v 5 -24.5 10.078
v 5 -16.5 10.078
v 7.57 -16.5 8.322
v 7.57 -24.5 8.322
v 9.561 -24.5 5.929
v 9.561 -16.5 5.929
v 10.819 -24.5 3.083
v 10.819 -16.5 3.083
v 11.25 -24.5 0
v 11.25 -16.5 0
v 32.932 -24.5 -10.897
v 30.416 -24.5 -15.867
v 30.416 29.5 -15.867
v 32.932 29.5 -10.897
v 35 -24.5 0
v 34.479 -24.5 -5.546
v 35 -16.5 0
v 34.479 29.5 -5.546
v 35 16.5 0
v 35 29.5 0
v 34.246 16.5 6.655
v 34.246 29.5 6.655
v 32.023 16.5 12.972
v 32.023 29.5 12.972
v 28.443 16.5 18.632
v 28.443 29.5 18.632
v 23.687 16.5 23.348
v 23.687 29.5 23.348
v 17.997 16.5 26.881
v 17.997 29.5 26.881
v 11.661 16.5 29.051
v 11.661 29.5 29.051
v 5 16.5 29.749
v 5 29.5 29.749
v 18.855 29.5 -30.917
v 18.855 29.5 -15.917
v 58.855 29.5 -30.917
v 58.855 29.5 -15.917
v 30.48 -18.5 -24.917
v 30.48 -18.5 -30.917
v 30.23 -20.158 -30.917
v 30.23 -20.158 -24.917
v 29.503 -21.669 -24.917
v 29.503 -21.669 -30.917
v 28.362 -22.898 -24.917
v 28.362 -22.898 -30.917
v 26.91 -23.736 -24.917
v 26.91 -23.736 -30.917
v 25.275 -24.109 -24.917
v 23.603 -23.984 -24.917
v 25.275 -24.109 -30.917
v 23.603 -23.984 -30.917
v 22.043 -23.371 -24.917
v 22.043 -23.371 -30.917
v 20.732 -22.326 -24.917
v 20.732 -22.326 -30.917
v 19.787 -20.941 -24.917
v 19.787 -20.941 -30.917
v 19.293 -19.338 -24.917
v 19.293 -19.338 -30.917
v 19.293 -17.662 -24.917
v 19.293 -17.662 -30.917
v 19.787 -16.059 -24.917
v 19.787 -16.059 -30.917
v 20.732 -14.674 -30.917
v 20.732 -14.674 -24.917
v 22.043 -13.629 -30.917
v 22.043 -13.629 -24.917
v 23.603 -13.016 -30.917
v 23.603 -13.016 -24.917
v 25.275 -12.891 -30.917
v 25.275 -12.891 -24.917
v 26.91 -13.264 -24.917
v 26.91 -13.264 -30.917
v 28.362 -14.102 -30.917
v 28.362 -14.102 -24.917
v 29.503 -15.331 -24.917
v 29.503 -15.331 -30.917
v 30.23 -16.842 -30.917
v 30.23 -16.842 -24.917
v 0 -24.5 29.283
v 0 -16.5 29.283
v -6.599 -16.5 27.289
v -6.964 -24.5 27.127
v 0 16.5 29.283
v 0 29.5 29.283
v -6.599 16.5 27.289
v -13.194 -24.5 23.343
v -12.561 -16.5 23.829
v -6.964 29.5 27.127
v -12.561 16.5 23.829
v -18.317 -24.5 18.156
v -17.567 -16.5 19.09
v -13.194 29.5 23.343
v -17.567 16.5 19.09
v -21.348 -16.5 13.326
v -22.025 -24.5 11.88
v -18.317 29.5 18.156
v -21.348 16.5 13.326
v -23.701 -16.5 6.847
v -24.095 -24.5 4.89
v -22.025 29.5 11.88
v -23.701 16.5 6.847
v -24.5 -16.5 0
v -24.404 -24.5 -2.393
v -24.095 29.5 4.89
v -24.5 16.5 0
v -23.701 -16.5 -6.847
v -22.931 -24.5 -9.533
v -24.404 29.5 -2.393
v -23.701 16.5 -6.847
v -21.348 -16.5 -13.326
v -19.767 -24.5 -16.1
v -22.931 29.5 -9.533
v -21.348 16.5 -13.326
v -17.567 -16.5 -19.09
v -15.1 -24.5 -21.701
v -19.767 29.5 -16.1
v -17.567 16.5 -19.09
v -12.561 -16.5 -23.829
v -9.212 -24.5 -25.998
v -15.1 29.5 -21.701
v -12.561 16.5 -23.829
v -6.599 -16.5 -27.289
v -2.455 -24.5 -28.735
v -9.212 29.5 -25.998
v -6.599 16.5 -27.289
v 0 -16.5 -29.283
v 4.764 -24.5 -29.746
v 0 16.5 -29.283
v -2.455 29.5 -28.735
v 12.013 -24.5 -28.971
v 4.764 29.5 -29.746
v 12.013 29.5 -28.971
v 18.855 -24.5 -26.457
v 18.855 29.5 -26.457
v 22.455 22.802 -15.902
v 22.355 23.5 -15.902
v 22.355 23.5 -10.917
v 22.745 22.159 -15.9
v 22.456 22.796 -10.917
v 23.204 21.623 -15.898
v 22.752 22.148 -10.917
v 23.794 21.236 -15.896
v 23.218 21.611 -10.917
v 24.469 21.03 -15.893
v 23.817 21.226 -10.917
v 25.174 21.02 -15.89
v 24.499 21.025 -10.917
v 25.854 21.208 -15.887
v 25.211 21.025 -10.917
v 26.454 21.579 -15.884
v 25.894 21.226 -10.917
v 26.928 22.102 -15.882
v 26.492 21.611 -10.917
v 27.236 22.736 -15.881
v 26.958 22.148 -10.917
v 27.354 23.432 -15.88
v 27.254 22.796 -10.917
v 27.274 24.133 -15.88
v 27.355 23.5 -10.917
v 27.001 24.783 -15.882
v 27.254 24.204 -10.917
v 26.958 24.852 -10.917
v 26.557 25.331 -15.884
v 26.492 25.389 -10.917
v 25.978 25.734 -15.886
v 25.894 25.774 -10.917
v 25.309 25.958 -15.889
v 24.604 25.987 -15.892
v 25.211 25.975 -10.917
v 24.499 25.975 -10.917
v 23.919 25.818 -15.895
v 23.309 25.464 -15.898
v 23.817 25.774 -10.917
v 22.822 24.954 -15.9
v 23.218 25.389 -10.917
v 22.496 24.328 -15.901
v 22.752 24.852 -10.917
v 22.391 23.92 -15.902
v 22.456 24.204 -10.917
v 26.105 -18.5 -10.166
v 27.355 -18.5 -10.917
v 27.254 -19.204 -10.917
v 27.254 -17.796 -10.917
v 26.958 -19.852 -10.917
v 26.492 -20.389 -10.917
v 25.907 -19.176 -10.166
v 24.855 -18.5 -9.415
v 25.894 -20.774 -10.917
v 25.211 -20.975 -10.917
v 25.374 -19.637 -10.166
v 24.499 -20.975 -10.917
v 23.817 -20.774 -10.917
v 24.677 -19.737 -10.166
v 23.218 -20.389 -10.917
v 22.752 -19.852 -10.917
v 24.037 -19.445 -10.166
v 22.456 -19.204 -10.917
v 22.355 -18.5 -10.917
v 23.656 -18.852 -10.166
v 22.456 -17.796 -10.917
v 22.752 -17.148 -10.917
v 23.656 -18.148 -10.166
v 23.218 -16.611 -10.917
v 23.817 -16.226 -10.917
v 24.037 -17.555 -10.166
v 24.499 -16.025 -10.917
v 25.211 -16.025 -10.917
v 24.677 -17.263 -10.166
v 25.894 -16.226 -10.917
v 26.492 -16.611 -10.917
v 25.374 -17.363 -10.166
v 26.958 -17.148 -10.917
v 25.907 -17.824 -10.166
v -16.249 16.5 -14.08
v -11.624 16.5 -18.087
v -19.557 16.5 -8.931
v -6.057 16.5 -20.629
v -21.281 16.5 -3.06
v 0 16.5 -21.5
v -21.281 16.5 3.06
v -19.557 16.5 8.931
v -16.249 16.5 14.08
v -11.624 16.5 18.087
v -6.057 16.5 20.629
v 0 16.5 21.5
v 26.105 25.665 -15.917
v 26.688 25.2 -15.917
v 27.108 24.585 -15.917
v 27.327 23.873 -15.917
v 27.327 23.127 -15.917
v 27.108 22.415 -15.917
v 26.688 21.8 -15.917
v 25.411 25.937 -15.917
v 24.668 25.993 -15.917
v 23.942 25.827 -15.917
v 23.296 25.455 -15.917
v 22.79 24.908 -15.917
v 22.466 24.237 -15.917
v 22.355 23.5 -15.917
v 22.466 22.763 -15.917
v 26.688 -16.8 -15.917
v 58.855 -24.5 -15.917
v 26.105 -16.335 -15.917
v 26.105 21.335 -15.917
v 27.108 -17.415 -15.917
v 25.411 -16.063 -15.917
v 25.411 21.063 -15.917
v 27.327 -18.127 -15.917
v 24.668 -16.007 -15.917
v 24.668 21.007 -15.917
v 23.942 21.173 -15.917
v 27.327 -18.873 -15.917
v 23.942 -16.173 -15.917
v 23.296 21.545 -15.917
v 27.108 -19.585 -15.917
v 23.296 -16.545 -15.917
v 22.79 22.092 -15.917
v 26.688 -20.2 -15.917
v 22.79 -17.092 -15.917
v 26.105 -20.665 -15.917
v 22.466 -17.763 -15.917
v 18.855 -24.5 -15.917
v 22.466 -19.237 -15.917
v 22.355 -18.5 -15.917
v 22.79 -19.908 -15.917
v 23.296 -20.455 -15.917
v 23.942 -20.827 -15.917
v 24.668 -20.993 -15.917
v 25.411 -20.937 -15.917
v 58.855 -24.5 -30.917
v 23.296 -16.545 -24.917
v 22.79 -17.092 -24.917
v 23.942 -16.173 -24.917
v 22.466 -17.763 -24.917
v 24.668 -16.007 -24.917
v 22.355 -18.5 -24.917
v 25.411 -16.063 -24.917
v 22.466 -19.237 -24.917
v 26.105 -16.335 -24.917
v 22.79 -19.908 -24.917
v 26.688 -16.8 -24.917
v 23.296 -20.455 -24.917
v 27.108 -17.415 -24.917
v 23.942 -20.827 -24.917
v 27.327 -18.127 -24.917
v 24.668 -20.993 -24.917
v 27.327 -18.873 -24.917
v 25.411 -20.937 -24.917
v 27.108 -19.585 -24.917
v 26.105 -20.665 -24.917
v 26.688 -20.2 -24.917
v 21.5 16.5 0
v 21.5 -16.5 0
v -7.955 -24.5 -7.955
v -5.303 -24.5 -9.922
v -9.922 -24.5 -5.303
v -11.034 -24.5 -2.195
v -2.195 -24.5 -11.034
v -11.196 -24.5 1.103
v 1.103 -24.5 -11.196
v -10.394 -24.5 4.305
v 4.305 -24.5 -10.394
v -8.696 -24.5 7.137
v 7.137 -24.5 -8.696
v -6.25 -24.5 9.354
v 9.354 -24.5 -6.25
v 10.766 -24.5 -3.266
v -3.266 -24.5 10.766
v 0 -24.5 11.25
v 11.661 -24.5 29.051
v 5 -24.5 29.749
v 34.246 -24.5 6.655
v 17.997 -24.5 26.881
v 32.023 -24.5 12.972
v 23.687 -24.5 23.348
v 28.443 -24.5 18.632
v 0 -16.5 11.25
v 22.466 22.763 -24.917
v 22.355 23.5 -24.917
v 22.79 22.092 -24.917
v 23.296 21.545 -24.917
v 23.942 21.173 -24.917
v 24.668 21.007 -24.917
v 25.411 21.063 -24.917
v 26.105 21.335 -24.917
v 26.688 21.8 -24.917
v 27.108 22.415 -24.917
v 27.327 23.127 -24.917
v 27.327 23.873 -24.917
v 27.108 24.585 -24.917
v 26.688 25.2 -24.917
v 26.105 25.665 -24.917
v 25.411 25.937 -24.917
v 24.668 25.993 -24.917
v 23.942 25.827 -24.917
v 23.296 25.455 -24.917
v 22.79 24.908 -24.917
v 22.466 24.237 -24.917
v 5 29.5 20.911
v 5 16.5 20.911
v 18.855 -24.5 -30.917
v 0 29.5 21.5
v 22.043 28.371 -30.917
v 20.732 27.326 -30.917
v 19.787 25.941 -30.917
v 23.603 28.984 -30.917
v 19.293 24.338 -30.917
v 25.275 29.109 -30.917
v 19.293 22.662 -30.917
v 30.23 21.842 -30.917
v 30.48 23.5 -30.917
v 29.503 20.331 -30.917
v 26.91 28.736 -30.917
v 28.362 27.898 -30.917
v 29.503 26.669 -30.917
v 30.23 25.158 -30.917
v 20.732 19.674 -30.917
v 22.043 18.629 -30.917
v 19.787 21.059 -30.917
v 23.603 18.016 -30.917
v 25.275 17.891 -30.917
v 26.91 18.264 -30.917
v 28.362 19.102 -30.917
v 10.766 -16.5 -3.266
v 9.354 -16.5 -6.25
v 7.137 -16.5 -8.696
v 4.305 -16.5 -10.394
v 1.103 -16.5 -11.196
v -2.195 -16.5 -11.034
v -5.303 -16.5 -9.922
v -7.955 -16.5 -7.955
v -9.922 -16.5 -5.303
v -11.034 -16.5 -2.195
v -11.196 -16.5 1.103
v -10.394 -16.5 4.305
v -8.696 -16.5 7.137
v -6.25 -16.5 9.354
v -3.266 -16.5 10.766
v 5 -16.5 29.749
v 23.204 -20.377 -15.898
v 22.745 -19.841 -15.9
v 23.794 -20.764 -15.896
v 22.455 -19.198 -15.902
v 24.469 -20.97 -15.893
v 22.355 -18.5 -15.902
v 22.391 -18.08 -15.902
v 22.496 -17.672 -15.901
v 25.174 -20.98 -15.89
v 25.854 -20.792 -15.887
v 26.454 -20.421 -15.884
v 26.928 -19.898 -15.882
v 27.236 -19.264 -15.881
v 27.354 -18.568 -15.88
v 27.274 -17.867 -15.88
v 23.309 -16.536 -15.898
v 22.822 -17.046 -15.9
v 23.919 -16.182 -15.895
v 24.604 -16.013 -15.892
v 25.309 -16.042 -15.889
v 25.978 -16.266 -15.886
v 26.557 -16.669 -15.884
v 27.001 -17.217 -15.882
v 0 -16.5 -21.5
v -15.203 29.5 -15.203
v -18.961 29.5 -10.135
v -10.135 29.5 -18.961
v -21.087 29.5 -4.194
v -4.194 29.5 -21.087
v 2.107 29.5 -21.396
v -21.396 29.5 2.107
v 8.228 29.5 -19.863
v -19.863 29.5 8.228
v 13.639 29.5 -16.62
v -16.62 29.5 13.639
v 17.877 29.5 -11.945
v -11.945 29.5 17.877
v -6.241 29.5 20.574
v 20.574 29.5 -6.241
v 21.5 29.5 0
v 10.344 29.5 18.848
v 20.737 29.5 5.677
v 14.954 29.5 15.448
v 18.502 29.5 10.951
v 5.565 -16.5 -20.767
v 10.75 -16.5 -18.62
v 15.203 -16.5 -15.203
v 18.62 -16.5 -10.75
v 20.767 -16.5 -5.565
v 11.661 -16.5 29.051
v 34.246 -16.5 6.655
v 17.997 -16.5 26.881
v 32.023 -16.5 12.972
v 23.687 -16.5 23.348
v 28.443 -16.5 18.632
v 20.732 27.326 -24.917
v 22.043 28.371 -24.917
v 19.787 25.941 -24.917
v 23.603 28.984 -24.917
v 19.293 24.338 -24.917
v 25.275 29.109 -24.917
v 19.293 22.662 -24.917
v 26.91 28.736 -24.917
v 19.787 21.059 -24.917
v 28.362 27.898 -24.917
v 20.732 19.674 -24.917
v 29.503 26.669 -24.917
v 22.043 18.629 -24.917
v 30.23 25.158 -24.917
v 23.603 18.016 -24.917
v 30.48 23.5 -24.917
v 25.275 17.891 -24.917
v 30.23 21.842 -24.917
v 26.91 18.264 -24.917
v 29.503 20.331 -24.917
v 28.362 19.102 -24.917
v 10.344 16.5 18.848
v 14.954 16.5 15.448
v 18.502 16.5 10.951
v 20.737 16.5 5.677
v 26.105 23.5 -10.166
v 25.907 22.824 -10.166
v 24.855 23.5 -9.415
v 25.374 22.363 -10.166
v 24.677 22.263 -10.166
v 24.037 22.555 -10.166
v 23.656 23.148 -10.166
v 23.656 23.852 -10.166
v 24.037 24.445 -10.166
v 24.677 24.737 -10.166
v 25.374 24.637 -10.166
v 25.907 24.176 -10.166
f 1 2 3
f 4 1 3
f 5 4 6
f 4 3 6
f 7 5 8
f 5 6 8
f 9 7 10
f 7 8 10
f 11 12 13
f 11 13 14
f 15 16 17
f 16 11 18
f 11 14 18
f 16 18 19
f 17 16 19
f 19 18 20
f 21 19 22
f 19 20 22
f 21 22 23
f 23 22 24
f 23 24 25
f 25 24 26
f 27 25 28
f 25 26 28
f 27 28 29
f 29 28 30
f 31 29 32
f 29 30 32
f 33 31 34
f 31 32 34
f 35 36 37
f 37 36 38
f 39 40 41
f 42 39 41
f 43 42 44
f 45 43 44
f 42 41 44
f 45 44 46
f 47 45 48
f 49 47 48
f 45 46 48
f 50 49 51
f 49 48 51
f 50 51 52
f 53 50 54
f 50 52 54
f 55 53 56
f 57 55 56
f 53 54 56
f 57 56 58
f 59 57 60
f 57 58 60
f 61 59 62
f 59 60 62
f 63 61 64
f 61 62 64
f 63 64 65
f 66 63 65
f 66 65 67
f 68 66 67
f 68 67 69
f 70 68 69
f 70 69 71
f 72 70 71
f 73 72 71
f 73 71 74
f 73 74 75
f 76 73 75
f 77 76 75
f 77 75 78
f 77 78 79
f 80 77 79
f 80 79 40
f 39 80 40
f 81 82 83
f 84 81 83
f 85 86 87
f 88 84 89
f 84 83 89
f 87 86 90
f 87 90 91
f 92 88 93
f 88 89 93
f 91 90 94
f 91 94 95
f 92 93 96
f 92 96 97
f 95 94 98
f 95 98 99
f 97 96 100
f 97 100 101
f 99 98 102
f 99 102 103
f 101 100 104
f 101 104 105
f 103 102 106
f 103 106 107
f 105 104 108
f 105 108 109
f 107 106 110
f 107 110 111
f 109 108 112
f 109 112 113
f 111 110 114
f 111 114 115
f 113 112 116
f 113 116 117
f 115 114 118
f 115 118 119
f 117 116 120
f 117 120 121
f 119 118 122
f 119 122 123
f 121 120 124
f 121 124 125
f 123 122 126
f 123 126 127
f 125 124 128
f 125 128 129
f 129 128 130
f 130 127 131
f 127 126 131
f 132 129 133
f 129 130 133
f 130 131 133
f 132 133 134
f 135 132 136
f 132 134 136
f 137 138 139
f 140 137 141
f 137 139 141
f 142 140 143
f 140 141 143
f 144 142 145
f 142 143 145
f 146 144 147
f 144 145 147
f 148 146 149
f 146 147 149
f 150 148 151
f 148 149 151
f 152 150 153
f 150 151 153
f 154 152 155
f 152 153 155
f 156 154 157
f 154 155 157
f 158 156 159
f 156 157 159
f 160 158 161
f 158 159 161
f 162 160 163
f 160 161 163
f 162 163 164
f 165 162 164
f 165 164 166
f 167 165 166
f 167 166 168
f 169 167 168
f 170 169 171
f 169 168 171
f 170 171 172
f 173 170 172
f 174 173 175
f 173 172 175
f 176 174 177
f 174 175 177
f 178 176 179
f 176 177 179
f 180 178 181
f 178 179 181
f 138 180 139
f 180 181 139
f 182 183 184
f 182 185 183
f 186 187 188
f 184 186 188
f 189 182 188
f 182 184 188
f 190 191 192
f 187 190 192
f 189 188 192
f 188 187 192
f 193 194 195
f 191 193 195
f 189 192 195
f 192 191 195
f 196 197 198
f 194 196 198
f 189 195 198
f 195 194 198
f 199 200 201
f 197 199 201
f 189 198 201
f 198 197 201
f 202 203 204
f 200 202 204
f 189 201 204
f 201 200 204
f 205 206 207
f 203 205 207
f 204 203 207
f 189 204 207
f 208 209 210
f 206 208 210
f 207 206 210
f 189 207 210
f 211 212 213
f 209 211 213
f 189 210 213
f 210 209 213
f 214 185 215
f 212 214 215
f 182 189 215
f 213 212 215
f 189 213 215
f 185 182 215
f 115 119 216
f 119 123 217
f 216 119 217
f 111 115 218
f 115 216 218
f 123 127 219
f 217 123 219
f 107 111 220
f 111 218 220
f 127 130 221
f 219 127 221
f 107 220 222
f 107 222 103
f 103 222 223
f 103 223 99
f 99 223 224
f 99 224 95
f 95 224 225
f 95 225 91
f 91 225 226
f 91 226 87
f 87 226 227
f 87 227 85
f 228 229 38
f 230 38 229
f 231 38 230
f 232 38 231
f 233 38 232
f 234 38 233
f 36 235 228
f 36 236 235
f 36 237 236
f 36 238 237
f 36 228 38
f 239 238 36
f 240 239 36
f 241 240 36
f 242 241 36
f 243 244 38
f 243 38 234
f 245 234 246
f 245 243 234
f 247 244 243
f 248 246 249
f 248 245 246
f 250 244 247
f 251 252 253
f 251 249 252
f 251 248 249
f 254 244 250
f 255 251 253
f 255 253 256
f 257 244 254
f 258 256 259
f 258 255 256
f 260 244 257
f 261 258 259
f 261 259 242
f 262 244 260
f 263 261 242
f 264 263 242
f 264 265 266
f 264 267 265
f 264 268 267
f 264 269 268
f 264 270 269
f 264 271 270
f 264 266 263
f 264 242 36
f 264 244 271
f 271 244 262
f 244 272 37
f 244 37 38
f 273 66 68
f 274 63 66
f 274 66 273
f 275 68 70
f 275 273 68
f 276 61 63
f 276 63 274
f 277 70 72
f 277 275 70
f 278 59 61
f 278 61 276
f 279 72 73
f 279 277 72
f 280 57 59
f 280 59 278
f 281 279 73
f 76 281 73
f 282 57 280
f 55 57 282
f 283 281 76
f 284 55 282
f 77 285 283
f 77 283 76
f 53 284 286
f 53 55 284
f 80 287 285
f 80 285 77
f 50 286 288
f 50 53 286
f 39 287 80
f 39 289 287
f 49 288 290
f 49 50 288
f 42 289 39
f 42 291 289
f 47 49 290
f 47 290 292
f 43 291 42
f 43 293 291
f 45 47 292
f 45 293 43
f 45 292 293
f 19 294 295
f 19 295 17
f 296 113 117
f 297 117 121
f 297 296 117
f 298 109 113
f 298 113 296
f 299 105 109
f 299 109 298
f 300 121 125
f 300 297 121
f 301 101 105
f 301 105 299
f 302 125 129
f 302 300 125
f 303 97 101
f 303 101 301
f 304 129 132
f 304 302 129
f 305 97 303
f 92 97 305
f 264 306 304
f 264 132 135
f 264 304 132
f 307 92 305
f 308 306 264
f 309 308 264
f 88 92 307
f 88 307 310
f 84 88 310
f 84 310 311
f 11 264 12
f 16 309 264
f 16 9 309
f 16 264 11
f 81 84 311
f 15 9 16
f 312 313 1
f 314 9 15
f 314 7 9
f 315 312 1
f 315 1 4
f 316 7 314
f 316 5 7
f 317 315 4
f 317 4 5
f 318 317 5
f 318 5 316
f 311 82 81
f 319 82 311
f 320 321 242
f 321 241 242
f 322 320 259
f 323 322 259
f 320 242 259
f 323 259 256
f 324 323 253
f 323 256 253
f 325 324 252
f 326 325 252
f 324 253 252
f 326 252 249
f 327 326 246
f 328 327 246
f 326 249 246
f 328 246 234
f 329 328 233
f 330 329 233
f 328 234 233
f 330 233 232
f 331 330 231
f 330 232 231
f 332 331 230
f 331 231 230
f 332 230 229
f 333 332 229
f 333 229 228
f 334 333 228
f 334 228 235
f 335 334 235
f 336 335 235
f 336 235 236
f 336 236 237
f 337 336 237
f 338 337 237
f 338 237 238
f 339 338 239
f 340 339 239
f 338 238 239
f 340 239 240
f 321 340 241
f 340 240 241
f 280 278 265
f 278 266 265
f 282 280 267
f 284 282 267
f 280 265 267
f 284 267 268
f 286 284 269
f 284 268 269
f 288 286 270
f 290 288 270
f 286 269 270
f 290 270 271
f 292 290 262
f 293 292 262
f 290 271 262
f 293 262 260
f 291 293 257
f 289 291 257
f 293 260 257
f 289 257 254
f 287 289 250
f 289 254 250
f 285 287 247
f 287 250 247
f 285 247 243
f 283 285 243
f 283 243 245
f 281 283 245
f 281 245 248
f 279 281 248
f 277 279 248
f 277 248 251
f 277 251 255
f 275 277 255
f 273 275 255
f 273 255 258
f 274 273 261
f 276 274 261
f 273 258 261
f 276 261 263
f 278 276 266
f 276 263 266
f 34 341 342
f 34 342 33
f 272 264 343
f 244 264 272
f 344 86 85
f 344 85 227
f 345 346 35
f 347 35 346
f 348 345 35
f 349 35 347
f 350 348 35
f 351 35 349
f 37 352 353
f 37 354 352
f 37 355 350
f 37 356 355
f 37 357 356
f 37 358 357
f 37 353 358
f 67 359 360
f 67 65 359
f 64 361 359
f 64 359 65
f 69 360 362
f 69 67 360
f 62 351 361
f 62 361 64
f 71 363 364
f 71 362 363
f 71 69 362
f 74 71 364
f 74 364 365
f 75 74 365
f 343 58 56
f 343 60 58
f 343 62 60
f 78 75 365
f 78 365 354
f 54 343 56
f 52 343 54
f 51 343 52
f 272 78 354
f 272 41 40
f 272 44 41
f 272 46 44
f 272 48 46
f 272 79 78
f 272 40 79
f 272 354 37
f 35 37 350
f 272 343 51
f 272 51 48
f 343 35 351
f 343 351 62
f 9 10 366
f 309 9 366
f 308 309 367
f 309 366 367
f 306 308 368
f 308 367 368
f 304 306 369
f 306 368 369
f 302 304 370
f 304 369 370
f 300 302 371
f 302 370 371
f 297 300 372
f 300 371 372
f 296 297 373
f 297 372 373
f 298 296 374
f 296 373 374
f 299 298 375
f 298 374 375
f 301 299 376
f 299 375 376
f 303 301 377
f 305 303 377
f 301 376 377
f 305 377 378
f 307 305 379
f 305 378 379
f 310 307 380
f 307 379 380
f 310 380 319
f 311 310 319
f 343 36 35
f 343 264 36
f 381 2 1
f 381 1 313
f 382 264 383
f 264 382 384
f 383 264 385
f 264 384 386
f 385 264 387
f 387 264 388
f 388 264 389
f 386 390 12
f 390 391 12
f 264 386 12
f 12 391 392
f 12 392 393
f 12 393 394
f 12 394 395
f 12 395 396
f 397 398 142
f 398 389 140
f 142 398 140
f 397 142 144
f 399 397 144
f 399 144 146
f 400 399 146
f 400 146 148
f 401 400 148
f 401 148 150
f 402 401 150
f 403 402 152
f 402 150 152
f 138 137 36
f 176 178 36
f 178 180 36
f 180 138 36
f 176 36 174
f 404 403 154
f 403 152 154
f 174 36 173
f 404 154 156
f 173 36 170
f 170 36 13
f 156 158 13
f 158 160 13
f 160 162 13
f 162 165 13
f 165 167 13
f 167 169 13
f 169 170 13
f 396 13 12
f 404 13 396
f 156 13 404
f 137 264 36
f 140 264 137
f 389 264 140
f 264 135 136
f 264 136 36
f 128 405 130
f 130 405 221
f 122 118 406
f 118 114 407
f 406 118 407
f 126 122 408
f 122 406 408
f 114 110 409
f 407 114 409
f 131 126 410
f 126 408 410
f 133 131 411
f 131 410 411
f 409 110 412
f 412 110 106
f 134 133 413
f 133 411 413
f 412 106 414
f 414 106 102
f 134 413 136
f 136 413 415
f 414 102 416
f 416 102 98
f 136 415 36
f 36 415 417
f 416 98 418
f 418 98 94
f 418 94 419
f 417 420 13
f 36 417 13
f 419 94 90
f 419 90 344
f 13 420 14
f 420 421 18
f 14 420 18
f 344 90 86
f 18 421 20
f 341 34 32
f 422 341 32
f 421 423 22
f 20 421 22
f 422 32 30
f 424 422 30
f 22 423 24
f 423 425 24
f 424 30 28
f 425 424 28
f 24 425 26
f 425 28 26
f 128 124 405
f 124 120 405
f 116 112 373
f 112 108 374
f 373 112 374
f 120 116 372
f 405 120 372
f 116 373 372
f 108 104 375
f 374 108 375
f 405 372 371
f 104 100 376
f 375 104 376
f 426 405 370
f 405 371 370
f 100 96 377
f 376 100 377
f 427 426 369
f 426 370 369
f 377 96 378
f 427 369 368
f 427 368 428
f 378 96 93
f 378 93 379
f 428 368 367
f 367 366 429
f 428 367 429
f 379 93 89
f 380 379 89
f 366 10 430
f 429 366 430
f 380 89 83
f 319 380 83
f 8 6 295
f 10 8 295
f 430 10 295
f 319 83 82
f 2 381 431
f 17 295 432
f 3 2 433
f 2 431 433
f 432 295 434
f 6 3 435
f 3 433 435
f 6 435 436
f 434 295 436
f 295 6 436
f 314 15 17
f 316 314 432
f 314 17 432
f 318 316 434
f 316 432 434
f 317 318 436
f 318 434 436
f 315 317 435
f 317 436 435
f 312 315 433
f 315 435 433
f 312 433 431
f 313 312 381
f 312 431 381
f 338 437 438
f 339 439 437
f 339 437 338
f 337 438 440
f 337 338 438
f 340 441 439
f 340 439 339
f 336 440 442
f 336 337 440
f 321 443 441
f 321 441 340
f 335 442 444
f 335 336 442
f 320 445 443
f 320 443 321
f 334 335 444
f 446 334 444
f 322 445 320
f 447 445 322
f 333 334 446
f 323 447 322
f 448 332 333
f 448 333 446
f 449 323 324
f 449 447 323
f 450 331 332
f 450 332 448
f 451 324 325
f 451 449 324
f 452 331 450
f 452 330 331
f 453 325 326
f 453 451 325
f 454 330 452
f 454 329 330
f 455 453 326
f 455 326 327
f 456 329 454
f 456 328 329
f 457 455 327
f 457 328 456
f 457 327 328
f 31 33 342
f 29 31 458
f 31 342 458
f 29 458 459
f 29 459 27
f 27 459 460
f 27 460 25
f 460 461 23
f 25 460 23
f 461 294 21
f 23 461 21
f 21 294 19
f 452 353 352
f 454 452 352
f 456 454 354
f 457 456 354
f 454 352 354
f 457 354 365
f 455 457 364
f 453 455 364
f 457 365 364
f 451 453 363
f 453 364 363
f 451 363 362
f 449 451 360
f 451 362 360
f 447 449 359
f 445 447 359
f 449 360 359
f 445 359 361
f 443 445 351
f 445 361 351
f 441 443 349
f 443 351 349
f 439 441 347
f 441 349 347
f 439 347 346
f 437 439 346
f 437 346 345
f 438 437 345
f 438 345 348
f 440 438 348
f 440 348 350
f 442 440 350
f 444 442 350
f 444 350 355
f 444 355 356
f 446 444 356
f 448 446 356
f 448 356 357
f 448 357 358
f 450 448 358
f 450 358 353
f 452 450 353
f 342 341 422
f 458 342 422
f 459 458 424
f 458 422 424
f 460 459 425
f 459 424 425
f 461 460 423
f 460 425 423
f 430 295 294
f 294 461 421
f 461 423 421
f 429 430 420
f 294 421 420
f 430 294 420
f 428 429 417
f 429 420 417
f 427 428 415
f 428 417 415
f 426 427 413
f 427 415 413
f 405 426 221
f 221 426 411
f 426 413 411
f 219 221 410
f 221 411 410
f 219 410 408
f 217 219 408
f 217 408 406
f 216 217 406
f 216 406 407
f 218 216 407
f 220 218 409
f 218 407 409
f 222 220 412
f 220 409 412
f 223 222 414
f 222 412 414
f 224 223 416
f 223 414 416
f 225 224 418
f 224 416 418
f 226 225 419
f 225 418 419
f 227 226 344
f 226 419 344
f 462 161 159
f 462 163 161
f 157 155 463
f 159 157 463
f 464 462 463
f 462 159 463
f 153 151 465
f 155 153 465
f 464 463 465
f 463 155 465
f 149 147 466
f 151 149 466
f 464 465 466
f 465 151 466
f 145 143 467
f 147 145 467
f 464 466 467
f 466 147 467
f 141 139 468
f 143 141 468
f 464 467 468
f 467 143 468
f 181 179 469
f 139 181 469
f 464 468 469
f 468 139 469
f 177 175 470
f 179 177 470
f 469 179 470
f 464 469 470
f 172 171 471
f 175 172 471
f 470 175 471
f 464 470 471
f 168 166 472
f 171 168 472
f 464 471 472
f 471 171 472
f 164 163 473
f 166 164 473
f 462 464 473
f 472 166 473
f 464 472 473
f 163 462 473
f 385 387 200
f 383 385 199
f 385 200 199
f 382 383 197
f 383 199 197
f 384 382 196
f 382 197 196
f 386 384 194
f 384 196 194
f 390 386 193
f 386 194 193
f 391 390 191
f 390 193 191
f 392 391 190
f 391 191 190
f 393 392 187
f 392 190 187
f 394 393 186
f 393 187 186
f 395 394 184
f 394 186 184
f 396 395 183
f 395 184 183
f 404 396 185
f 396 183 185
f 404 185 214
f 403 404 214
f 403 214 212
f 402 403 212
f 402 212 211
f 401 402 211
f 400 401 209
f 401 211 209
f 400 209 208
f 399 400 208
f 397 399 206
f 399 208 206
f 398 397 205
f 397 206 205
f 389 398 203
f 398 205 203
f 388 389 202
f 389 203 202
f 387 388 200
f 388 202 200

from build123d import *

# Parameters (mm, degrees)
F1_DEPTH         = 24.5
F1_DEPTH_BACK    = 29.5
F2_START         = 16.5
F2_DEPTH         = 8
F3_W             = 66
F3_H             = 33
F4_DEPTH         = 40
F5_DEPTH         = 29.501
F5_DEPTH_BACK    = 25
F6_DEPTH         = 24.5
F6_DEPTH_BACK    = 29.5
F8_D             = 5
F8_DEPTH         = 20
F8_CBORE_D       = 11.25
F8_CBORE_DEPTH   = 6
F8_TIP           = 1.5021515476
F8_2_D           = 5
F8_2_DEPTH       = 20
F8_2_CBORE_D     = 11.25
F8_2_CBORE_DEPTH = 6
F8_2_TIP         = 1.5021515476
F9_W             = 33
F9_H             = 63.3698031306
F10_DEPTH        = 28.1


with BuildPart() as f1:
    # F0 (on Front) → F1 (new body, two sides)
    with BuildSketch(Plane.XZ) as f1_sk:
        with BuildLine():
            ThreePointArc((0, 21.5), (2.5173141614, 21.3521223632), (5, 20.9105236663))
            Line((5, 20.9105236663), (5, 29.7489495613))
            ThreePointArc((5, 29.7489495613), (2.4901533128, 29.6217107248), (0, 29.2831009287))
            Line((0, 29.2831009287), (0, 21.5))
        make_face()
        with BuildLine():
            Line((5, 29.7489495613), (5, 20.9105236663))
            ThreePointArc((5, 20.9105236663), (16.8782404296, 13.3182206019), (21.5, 0))
            ThreePointArc((21.5, 0), (-15.2027957955, -15.2027957955), (0, 21.5))
            Line((0, 21.5), (0, 29.2831009287))
            ThreePointArc((0, 29.2831009287), (-22.9313190623, -9.53287763), (18.8551100849, -26.4568229305))
            Line((18.8551100849, -26.4568229305), (18.8551100849, -15.9174033455))
            Line((18.8551100849, -15.9174033455), (30.4156787886, -15.8666666667))
            ThreePointArc((30.4156787886, -15.8666666667), (33.8309503337, -8.2578313146), (35, 0))
            ThreePointArc((35, 0), (26.1978519185, 21.1246301743), (5, 29.7489495613))
        make_face()
    extrude(amount=F1_DEPTH)
    extrude(f1_sk.sketch, amount=-F1_DEPTH_BACK)

    # F0 (on Front) → F2 (join)
    with BuildSketch(Plane.XZ.offset(F2_START)):
        with BuildLine():
            ThreePointArc((0, 11.25), (2.5677811837, 10.9530360993), (5, 10.0778221854))
            Line((5, 10.0778221854), (5, 20.9105236663))
            ThreePointArc((5, 20.9105236663), (2.5173141614, 21.3521223632), (0, 21.5))
            Line((0, 21.5), (0, 11.25))
        make_face()
        with BuildLine():
            ThreePointArc((5, 10.0778221854), (9.560661588, 5.9292706128), (11.25, 0))
            ThreePointArc((11.25, 0), (-7.9549512883, -7.9549512883), (0, 11.25))
            Line((0, 11.25), (0, 21.5))
            ThreePointArc((0, 21.5), (-15.2027957955, -15.2027957955), (21.5, 0))
            ThreePointArc((21.5, 0), (16.8782404296, 13.3182206019), (5, 20.9105236663))
            Line((5, 20.9105236663), (5, 10.0778221854))
        make_face()
    extrude(amount=F2_DEPTH)

    # F3 (on Top) → F4 (cut)
    with BuildSketch(Plane.XY):
        with Locations((2.857523039, 0)):
            Rectangle(F3_W, F3_H)
    extrude(amount=F4_DEPTH, mode=Mode.SUBTRACT)

    # F0 (on Front) → F5 (cut, two sides)
    with BuildSketch(Plane.XZ) as f5_sk:
        with BuildLine():
            ThreePointArc((0, 11.25), (2.5677811837, 10.9530360993), (5, 10.0778221854))
            Line((5, 10.0778221854), (5, 20.9105236663))
            ThreePointArc((5, 20.9105236663), (2.5173141614, 21.3521223632), (0, 21.5))
            Line((0, 21.5), (0, 11.25))
        make_face()
        with BuildLine():
            ThreePointArc((0, 21.5), (2.5173141614, 21.3521223632), (5, 20.9105236663))
            Line((5, 20.9105236663), (5, 29.7489495613))
            ThreePointArc((5, 29.7489495613), (2.4901533128, 29.6217107248), (0, 29.2831009287))
            Line((0, 29.2831009287), (0, 21.5))
        make_face()
    extrude(amount=-F5_DEPTH, mode=Mode.SUBTRACT)
    extrude(f5_sk.sketch, amount=F5_DEPTH_BACK, mode=Mode.SUBTRACT)

    # F8
    with Locations(Plane(origin=(0, 0, -30.9174033455), x_dir=(1, 0, 0), z_dir=(0, 0, -1))):
        with Locations((24.8551100849, 18.5), (24.8551100849, -23.5)):
            CounterBoreHole(F8_D / 2, F8_CBORE_D / 2, F8_CBORE_DEPTH, depth=F8_DEPTH)
            with Locations((0, 0, -(F8_DEPTH + F8_TIP / 2))):  # 118° drill point
                Cone(0, F8_D / 2, F8_TIP, mode=Mode.SUBTRACT)

    # F9 (on Right) → F10 (cut)
    with BuildSketch(Plane.YZ):
        Rectangle(F9_W, F9_H)
    extrude(amount=-F10_DEPTH, mode=Mode.SUBTRACT)


with BuildPart() as f6:
    # F0 (on Front) → F6 (new body, two sides)
    with BuildSketch(Plane.XZ) as f6_sk:
        with BuildLine():
            ThreePointArc((30.3836183376, -15.9174033455), (25.323418026, -21.9572400077), (18.8551100849, -26.4568229305))
            Line((18.8551100849, -26.4568229305), (18.8551100849, -30.9174033455))
            Line((18.8551100849, -30.9174033455), (58.8551100849, -30.9174033455))
            Line((58.8551100849, -30.9174033455), (58.8551100849, -15.9174033455))
            Line((58.8551100849, -15.9174033455), (30.3836183376, -15.9174033455))
        make_face()
        with BuildLine():
            Line((18.8551100849, -15.9174033455), (18.8551100849, -26.4568229305))
            ThreePointArc((18.8551100849, -26.4568229305), (25.323418026, -21.9572400077), (30.3836183376, -15.9174033455))
            Line((30.3836183376, -15.9174033455), (18.8551100849, -15.9174033455))
        make_face()
    extrude(amount=F6_DEPTH)
    extrude(f6_sk.sketch, amount=-F6_DEPTH_BACK)

    # F8#2
    with Locations(Plane(origin=(0, 0, -30.9174033455), x_dir=(1, 0, 0), z_dir=(0, 0, -1))):
        with Locations((24.8551100849, 18.5), (24.8551100849, -23.5)):
            CounterBoreHole(F8_2_D / 2, F8_2_CBORE_D / 2, F8_2_CBORE_DEPTH, depth=F8_2_DEPTH)
            with Locations((0, 0, -(F8_2_DEPTH + F8_2_TIP / 2))):  # 118° drill point
                Cone(0, F8_2_D / 2, F8_2_TIP, mode=Mode.SUBTRACT)


solid = Compound([f1.part, f6.part])
